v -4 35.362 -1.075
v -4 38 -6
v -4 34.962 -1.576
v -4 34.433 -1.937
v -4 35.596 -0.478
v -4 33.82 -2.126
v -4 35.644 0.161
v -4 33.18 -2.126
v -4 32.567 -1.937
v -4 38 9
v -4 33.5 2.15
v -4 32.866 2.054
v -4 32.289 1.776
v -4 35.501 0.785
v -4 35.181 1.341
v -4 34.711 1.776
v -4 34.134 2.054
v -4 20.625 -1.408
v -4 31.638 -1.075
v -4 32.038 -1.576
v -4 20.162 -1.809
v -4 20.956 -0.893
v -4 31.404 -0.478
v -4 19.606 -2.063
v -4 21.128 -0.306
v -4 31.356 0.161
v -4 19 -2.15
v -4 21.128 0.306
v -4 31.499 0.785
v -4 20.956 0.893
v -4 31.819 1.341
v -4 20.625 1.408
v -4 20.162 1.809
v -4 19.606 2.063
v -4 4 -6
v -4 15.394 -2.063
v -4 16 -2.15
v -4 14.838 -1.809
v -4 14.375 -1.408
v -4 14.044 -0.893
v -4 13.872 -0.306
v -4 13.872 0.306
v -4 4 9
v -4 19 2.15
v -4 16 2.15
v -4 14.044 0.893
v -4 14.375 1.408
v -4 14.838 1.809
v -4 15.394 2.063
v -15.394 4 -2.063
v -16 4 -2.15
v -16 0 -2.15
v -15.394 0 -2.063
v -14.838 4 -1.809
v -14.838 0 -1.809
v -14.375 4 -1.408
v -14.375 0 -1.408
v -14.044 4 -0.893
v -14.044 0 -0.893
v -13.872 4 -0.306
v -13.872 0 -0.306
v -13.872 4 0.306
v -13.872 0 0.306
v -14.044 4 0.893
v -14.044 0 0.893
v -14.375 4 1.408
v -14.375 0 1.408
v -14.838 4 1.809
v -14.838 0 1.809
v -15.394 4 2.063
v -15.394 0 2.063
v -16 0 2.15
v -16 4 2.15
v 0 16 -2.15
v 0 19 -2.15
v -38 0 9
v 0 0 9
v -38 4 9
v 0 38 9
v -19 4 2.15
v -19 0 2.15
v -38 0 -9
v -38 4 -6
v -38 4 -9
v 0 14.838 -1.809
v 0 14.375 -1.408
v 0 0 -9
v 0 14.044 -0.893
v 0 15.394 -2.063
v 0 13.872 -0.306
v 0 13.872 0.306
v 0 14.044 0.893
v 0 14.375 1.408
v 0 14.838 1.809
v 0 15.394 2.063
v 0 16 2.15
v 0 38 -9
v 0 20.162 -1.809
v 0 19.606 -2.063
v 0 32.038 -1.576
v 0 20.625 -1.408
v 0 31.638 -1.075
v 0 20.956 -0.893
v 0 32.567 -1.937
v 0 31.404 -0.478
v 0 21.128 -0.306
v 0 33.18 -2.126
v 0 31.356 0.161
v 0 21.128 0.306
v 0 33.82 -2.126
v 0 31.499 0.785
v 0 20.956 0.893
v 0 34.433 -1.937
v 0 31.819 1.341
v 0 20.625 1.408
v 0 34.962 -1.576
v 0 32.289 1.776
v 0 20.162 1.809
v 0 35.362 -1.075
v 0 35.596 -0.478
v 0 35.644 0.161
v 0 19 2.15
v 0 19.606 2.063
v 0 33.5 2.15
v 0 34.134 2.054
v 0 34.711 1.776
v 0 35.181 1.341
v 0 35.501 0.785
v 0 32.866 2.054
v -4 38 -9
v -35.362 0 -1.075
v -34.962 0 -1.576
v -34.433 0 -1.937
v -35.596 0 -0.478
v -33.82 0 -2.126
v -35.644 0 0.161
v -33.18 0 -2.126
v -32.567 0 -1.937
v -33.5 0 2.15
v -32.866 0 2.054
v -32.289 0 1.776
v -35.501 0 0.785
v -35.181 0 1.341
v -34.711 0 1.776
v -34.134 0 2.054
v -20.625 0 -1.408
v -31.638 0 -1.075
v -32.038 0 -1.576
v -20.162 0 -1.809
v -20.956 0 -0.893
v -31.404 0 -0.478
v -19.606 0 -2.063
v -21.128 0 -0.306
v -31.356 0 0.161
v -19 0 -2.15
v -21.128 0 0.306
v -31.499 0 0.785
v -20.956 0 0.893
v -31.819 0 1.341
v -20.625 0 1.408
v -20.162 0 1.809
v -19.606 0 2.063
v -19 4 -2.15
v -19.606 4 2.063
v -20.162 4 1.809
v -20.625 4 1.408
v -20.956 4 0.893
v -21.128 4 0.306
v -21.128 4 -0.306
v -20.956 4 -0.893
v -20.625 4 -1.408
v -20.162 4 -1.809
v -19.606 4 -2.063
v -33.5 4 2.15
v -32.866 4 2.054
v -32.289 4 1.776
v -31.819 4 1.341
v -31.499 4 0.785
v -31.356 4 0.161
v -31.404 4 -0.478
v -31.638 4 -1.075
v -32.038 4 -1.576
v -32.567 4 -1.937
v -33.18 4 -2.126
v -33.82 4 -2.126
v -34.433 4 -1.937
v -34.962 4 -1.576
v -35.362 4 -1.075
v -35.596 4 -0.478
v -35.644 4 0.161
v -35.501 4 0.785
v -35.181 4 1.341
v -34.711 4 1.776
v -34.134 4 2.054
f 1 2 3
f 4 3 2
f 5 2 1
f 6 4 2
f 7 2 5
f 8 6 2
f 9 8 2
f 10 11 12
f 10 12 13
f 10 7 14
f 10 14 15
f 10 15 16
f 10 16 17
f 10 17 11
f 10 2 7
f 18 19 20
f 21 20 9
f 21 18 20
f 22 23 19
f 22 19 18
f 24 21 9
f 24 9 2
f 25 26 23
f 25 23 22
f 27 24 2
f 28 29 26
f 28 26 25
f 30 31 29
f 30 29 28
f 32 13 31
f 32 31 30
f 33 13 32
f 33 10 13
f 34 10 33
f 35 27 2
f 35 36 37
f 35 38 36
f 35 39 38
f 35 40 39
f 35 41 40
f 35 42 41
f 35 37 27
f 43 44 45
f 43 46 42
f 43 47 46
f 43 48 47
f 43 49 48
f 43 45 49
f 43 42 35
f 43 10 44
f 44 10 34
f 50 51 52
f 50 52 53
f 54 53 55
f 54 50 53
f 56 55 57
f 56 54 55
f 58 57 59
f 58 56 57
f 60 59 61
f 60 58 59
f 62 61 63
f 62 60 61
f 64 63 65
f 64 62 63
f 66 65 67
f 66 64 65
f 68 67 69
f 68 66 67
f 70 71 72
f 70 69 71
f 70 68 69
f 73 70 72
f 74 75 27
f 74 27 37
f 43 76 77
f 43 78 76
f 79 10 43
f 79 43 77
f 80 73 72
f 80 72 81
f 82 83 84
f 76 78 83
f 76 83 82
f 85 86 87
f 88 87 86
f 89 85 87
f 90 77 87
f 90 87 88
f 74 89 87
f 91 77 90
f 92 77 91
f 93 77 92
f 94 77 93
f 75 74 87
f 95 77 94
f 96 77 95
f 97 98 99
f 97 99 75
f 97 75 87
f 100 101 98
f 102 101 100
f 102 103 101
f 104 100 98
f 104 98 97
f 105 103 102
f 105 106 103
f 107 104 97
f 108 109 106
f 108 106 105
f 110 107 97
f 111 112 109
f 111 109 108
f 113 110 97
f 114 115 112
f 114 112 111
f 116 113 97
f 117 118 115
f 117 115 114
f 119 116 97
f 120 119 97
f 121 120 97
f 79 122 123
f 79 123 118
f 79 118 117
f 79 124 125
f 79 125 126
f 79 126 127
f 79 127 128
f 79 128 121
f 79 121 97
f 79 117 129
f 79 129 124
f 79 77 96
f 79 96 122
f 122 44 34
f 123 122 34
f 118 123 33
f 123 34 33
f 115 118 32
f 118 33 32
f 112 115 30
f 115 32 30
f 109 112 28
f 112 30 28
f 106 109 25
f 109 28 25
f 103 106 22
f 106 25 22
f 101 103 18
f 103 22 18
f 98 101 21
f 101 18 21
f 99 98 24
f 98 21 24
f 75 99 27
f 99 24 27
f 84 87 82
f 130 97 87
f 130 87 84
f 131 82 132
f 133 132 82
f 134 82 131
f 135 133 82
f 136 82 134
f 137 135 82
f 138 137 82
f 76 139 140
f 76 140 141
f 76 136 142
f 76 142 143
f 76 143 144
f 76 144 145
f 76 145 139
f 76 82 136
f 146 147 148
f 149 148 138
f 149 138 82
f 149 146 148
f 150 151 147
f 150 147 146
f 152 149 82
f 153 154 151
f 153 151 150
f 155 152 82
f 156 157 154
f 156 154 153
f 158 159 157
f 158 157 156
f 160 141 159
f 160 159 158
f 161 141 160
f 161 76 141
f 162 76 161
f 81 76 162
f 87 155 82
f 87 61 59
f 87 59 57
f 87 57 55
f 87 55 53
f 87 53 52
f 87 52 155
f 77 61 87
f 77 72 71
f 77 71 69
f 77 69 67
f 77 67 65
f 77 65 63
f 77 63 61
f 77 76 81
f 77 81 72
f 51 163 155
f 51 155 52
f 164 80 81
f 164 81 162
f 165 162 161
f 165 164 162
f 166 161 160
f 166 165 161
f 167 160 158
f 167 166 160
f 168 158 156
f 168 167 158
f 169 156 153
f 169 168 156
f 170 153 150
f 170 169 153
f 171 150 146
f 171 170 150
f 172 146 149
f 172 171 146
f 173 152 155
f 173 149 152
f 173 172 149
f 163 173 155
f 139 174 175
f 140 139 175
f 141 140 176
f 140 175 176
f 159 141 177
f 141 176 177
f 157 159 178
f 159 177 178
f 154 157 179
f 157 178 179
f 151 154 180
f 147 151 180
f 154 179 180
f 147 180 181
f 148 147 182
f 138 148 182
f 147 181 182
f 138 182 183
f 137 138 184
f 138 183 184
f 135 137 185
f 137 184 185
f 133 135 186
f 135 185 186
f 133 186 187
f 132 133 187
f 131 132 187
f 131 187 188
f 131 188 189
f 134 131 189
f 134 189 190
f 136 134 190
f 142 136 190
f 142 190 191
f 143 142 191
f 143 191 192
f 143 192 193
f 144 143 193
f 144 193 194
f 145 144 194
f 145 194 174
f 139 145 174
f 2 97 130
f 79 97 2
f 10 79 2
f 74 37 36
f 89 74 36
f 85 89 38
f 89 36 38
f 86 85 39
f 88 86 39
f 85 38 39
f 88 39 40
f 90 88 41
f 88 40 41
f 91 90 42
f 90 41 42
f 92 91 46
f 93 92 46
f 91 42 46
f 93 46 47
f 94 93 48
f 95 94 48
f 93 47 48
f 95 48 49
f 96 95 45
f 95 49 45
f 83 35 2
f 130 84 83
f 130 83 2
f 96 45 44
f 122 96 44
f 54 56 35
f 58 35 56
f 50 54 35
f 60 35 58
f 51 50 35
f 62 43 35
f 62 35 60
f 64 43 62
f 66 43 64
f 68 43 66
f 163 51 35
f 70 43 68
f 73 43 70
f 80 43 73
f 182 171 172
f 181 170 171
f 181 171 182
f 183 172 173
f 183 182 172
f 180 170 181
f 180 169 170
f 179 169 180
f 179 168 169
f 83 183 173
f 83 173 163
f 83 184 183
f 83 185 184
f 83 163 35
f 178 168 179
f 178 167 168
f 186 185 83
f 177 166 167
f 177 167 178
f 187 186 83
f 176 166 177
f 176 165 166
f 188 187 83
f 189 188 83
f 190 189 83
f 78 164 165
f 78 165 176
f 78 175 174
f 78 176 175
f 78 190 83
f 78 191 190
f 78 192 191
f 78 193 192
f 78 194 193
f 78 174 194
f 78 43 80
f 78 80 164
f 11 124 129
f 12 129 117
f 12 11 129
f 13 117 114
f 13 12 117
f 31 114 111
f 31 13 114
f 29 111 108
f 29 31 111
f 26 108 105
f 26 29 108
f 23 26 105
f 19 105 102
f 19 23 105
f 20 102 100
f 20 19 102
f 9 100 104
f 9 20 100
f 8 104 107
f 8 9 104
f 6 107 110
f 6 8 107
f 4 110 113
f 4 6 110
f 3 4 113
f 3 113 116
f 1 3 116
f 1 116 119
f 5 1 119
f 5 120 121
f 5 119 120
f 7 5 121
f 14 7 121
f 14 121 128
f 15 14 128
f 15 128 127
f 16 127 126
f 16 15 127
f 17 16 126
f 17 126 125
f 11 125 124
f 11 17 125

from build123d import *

# Parameters (mm, degrees)
EXTRUDE_1_DEPTH     = 9
EXTRUDE_2_DEPTH     = 3
SKETCH_4_R          = 2.15
CUT_EXTRUDE_1_DEPTH = 52.778373864


with BuildPart() as part:
    # 草图1 → 凸台-拉伸1 (new, symmetric)
    with BuildSketch(Plane.XY):
        Polygon((-38, 0), (0, 0), (0, 38), (-4, 38), (-4, 4), (-38, 4), align=None)
    extrude(amount=EXTRUDE_1_DEPTH, both=True)

    # 草图3 → 凸台-拉伸2 (add)
    with BuildSketch(Plane(origin=(0, 0, -9), x_dir=(-1, 0, 0), z_dir=(0, 0, -1))):
        Polygon((38, 4), (4, 38), (4, 4), align=None)
    extrude(amount=-EXTRUDE_2_DEPTH)

    # 草图4 → 切除-拉伸1 (cut, through all)
    with BuildSketch(Plane(origin=(0, 4, 0), x_dir=(1, 0, 0), z_dir=(0, 1, 0))):
        with Locations(Location((-33.5, 0, 0), (0, 0, 270))):
            Circle(SKETCH_4_R)
        with BuildLine():
            Line((-16, -2.15), (-19, -2.15))
            ThreePointArc((-19, -2.15), (-21.15, 0), (-19, 2.15))
            Line((-19, 2.15), (-16, 2.15))
            ThreePointArc((-16, 2.15), (-13.85, 0), (-16, -2.15))
        make_face()
    cut_extrude_1 = extrude(amount=-CUT_EXTRUDE_1_DEPTH, mode=Mode.SUBTRACT)

    # 镜向1: 切除-拉伸1 across plane
    add(cut_extrude_1.mirror(Plane(origin=(0, 0, 0), x_dir=(0, 0, 1), z_dir=(-0.7071067811865477, -0.7071067811865475, 0))), mode=Mode.SUBTRACT)


solid = part.part
